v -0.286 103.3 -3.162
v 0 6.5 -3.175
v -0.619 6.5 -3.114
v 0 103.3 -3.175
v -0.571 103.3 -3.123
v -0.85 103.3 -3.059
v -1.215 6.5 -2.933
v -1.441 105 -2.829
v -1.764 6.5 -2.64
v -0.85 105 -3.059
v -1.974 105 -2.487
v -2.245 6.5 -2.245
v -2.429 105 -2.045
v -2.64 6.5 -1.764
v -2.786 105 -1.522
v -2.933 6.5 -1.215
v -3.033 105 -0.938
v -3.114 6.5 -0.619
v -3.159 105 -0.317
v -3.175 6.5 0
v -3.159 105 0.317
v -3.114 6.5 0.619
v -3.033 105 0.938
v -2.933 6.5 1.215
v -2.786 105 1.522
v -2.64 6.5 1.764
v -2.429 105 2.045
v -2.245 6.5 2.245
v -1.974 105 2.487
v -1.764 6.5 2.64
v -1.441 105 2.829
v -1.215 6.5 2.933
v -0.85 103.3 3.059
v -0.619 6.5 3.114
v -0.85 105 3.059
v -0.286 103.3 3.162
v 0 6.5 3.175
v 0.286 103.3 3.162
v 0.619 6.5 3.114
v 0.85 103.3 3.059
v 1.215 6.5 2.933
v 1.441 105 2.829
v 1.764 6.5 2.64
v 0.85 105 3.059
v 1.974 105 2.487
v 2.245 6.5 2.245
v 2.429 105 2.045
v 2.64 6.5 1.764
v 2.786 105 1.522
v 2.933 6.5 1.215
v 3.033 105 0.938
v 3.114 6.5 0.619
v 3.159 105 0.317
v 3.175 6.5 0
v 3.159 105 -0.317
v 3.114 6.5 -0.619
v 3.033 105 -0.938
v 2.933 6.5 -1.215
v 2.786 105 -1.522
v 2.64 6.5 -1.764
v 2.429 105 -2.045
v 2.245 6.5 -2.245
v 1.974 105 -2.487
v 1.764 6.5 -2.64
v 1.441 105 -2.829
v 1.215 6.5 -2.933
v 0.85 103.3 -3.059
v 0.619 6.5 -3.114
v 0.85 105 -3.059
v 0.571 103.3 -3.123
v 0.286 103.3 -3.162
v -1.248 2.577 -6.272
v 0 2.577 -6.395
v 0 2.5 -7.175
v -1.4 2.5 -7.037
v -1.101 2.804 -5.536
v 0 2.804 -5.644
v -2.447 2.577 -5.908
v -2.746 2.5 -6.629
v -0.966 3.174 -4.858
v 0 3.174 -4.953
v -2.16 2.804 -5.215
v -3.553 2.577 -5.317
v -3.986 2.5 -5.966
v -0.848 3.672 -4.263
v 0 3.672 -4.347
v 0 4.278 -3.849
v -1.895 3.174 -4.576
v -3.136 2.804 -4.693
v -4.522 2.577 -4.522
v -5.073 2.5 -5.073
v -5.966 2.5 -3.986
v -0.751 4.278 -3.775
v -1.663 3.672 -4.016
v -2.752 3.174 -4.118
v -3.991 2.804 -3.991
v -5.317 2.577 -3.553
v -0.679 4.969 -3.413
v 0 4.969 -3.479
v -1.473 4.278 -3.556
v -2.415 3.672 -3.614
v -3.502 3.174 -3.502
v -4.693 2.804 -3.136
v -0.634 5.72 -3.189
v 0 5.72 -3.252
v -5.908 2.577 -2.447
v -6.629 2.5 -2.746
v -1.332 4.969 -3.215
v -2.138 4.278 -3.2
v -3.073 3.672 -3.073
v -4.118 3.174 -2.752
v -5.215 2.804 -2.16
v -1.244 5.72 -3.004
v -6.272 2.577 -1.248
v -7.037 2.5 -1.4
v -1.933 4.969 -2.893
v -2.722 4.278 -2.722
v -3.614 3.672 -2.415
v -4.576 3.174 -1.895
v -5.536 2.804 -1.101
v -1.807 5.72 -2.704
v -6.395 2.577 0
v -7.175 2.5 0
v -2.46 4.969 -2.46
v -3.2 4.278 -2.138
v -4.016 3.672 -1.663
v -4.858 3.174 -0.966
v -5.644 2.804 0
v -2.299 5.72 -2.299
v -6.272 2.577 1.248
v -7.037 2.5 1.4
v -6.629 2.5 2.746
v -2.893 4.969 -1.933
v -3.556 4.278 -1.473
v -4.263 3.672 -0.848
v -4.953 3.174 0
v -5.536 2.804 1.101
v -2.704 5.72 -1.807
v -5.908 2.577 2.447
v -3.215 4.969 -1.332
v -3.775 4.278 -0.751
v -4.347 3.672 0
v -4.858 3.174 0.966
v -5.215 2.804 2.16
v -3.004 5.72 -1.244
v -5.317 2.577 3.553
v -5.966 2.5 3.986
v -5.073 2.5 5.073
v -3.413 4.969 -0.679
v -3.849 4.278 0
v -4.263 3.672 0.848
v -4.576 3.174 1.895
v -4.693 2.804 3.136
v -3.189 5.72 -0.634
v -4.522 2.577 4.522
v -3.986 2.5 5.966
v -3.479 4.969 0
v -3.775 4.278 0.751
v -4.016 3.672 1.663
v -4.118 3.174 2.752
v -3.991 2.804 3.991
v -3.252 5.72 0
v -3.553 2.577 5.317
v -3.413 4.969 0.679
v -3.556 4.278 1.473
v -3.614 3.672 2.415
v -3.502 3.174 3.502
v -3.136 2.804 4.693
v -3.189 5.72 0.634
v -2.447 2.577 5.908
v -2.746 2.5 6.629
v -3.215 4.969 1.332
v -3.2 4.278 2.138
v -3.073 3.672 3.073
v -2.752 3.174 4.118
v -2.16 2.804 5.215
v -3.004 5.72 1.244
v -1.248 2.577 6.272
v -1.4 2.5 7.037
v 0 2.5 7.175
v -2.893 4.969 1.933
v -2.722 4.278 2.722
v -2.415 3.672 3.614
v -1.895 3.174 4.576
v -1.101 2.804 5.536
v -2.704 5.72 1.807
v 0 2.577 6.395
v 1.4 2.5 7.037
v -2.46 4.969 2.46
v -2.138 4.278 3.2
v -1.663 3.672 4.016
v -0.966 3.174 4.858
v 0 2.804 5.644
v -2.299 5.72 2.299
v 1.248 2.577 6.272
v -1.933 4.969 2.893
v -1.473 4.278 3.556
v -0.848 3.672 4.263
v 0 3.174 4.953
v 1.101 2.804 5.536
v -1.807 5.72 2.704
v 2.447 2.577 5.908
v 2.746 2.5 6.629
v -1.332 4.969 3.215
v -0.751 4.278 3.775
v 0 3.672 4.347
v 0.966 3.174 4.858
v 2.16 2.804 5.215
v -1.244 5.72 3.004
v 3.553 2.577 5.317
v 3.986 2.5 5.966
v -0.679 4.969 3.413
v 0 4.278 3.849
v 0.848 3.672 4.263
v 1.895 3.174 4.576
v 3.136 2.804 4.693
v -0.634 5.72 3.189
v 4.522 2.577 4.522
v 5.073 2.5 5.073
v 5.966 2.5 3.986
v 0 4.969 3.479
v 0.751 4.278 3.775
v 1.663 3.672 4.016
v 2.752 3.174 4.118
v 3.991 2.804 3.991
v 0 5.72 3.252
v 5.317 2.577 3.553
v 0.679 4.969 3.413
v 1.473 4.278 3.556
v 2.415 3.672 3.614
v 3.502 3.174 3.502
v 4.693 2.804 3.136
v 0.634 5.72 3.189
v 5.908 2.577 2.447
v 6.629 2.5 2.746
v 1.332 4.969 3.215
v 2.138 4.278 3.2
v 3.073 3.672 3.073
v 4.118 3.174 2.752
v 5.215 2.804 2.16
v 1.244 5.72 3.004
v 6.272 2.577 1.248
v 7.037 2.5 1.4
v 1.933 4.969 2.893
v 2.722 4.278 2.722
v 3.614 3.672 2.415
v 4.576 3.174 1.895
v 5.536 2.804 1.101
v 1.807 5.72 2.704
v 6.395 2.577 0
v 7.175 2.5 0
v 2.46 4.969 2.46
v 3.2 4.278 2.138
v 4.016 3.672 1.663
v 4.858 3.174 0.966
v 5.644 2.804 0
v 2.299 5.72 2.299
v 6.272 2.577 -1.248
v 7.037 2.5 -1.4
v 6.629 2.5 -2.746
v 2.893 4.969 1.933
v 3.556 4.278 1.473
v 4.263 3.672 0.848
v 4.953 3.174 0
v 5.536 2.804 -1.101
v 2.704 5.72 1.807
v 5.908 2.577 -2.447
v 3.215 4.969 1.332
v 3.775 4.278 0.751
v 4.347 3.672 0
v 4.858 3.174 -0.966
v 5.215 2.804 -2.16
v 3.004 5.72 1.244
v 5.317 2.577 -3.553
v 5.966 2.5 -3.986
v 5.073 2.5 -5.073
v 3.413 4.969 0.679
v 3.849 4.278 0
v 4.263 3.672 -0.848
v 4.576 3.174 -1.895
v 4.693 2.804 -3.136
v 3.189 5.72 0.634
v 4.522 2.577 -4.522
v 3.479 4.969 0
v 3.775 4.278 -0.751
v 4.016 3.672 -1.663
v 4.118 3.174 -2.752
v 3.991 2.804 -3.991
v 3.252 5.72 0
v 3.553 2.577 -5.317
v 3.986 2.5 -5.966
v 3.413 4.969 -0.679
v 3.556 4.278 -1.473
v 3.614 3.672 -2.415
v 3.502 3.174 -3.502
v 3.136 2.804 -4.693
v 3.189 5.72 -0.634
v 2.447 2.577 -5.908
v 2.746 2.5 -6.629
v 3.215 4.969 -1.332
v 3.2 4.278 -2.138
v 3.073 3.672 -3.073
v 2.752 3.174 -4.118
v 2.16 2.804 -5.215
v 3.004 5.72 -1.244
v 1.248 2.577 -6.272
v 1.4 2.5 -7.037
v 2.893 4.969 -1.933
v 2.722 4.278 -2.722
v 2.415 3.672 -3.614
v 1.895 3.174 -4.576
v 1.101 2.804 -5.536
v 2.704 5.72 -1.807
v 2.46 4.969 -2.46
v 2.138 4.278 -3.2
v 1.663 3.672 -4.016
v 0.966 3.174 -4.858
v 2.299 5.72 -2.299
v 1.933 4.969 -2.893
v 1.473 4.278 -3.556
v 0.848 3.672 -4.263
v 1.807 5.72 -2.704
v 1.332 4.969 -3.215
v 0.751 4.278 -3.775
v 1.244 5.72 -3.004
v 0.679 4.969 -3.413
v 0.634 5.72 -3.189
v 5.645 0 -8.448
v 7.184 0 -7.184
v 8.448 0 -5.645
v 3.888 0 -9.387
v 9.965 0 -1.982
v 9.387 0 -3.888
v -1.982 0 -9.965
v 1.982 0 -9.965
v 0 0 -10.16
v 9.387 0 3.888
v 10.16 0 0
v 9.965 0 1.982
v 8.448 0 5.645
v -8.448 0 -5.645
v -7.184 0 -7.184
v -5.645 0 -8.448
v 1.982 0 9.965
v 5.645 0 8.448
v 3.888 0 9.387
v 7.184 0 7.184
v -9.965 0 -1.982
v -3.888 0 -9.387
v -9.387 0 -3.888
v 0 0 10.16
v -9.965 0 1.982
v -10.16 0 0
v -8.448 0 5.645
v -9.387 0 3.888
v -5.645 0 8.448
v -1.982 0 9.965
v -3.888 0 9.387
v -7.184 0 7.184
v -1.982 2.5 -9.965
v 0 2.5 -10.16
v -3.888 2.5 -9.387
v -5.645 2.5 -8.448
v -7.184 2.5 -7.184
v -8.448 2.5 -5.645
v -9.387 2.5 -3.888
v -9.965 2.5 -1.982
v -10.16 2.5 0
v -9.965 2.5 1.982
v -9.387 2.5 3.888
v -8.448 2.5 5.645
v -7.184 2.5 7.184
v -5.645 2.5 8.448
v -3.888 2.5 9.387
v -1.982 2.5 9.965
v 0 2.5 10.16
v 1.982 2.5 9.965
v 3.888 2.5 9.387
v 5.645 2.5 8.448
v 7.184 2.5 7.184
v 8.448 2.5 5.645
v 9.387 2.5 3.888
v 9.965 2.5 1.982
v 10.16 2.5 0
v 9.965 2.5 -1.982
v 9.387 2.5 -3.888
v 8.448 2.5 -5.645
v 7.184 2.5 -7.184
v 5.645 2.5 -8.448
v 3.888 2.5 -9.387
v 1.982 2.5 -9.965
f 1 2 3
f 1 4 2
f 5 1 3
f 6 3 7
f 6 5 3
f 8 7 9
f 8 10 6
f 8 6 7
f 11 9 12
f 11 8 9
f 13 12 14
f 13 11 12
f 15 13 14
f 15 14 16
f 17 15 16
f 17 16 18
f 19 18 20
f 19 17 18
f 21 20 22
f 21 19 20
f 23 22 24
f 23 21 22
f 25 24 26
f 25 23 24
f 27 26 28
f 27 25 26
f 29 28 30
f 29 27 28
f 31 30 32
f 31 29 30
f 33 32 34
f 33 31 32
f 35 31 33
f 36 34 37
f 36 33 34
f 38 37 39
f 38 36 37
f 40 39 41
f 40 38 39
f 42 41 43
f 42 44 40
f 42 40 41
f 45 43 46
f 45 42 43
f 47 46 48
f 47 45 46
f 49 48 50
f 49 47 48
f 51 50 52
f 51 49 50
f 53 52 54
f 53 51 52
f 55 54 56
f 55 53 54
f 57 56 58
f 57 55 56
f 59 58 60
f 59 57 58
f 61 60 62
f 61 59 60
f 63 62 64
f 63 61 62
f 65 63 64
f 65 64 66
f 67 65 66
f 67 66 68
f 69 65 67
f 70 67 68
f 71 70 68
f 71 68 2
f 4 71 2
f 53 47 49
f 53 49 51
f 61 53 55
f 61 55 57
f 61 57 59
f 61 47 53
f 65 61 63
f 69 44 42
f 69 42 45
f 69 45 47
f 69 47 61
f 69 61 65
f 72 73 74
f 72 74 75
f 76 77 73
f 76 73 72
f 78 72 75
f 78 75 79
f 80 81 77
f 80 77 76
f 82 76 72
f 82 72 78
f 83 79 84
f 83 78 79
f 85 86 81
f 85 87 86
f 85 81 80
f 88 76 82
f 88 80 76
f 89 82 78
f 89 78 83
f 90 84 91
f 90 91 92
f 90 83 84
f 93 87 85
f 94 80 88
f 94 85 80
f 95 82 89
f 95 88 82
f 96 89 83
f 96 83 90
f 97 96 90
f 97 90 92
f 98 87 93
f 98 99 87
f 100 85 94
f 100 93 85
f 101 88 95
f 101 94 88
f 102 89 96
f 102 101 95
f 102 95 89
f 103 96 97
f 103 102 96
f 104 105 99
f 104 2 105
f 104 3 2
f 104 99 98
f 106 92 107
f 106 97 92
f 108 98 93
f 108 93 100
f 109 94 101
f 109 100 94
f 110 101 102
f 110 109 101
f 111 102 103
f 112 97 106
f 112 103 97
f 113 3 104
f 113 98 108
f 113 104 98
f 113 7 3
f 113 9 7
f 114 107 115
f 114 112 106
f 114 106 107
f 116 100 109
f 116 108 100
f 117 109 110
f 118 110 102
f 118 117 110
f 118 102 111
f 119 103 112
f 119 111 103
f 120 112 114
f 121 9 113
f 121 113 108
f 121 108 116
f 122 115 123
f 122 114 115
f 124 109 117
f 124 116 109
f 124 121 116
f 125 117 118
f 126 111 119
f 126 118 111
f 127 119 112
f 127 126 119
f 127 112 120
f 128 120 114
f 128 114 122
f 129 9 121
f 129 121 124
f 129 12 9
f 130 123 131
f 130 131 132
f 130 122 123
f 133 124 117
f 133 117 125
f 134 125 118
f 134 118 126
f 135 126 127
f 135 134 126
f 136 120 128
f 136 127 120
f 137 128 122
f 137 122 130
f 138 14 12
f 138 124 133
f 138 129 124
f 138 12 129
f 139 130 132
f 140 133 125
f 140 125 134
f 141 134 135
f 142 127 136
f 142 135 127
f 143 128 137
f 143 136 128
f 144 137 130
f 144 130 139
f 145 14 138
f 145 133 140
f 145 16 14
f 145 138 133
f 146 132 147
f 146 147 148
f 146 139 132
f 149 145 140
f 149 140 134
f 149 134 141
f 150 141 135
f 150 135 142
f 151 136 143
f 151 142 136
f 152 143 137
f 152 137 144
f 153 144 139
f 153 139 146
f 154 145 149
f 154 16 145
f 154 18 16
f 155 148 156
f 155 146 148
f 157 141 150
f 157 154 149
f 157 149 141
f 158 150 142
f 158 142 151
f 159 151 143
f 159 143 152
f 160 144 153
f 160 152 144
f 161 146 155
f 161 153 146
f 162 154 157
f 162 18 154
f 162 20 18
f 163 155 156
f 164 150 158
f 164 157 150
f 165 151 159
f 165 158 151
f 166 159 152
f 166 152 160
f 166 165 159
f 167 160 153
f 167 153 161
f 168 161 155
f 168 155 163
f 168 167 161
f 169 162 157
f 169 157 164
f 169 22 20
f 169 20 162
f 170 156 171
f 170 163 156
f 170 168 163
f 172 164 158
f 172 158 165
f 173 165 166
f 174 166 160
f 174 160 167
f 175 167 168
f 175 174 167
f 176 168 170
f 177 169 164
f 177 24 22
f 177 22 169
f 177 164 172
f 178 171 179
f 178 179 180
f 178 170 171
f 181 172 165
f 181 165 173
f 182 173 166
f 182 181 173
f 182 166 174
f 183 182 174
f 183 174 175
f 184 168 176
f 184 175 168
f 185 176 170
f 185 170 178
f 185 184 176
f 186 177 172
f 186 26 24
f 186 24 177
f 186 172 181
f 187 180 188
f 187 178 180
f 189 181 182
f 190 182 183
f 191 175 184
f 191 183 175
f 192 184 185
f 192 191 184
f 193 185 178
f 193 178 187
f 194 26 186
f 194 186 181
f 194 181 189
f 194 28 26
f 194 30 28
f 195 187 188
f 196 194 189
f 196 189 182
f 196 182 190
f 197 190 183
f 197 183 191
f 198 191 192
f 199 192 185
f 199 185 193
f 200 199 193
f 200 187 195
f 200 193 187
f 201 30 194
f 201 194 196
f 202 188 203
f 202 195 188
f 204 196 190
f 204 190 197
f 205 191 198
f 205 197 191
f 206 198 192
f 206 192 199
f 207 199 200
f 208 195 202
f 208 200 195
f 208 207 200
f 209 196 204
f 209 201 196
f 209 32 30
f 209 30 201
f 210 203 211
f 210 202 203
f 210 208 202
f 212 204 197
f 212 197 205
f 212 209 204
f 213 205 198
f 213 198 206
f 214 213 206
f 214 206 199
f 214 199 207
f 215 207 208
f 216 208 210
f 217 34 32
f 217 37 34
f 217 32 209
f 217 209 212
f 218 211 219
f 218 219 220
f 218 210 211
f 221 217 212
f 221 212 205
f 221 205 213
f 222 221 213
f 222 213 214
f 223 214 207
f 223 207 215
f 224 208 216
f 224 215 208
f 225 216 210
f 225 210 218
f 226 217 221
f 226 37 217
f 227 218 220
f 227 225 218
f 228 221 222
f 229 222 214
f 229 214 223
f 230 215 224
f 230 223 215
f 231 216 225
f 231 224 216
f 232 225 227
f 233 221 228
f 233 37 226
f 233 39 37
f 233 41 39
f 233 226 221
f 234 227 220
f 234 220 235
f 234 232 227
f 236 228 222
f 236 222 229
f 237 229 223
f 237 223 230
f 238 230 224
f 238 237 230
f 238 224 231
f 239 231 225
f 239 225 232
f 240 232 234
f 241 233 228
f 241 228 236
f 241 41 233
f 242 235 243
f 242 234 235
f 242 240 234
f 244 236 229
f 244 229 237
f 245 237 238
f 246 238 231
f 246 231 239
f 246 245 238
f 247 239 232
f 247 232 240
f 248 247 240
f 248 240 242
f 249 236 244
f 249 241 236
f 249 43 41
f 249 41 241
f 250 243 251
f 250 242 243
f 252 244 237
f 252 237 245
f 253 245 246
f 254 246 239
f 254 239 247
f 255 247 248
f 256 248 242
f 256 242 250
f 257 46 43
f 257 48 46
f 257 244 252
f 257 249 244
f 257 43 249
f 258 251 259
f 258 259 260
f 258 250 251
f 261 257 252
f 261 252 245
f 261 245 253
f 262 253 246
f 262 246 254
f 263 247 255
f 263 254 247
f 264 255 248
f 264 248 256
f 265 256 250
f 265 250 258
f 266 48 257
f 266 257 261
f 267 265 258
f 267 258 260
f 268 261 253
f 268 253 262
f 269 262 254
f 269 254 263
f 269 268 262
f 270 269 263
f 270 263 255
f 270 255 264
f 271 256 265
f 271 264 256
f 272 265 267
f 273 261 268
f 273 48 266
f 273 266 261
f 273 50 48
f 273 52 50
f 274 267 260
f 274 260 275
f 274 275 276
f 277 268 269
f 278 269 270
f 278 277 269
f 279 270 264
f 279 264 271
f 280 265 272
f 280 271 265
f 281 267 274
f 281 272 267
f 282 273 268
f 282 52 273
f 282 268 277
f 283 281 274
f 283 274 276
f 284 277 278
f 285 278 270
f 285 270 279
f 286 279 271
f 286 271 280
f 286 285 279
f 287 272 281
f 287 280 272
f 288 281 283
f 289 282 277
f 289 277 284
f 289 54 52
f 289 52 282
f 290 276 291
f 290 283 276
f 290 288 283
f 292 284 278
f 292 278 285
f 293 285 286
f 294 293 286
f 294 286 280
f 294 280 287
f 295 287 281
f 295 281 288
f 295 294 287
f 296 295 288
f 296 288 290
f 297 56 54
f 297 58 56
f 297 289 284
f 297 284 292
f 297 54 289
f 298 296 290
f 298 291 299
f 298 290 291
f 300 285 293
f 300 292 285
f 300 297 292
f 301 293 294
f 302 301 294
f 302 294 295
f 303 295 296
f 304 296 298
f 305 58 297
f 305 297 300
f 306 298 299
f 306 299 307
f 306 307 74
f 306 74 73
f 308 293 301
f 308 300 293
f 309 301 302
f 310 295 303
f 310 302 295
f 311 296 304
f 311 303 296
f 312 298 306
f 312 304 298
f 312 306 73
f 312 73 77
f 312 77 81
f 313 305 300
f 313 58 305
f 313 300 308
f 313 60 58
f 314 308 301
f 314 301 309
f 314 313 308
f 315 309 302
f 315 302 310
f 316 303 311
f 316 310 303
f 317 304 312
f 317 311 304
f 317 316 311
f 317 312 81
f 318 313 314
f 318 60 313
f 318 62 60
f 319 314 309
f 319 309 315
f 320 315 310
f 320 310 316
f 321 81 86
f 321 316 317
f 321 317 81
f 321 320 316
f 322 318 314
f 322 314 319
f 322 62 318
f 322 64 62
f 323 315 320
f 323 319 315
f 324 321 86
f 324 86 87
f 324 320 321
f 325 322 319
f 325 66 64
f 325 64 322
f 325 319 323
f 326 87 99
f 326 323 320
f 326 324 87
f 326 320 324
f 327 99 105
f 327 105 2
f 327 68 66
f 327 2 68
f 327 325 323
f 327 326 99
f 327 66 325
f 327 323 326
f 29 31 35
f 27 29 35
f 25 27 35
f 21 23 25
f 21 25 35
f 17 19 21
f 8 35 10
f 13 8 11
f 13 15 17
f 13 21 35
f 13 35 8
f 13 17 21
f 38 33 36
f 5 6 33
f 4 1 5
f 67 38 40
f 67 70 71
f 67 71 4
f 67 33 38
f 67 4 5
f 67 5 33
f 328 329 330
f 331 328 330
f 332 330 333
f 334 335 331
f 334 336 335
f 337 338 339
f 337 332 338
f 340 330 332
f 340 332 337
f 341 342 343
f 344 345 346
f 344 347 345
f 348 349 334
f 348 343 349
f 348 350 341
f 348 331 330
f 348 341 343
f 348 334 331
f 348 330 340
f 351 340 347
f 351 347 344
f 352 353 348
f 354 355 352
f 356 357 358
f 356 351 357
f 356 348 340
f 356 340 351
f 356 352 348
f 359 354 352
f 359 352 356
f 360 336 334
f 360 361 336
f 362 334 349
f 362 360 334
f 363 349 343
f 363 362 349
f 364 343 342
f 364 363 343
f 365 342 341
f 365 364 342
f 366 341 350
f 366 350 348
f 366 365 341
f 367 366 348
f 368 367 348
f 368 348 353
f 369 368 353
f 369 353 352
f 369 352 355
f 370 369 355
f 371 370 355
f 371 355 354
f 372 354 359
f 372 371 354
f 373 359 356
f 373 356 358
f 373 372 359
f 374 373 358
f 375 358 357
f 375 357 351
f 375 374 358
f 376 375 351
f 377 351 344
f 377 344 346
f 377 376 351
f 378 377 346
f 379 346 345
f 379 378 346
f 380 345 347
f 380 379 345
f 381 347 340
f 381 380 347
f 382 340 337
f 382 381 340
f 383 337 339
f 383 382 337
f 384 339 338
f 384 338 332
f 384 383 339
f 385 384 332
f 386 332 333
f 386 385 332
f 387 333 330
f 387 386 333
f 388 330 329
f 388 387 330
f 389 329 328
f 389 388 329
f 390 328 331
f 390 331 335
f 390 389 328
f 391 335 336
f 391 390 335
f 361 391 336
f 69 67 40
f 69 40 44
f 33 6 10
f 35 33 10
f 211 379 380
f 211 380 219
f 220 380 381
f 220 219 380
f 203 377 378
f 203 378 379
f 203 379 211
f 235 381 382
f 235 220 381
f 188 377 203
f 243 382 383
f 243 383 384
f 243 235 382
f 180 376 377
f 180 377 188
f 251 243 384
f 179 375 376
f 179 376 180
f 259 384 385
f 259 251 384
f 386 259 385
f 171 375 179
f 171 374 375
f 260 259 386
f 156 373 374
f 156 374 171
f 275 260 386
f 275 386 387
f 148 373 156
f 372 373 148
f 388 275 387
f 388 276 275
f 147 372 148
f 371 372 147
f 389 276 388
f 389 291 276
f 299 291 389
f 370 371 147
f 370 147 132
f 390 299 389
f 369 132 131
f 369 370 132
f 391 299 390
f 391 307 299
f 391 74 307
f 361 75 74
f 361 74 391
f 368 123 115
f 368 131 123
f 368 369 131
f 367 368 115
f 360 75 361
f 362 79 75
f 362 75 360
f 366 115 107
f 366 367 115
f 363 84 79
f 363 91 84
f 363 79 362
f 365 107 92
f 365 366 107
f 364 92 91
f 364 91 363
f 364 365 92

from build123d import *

# Parameters (mm, degrees)
FILLET1_R               = 4
CUT_EXTRUDE3_DEPTH      = 106.978541224
CUT_EXTRUDE3_DEPTH_BACK = 106.978541224
SKETCH4_W               = 1.7
SKETCH4_H               = 1.7


with BuildPart() as part:
    # Sketch1 → Revolve1 (revolve)
    with BuildSketch(Plane.XY, mode=Mode.PRIVATE) as revolve1_sk:
        Polygon((0, 0), (10.16, 0), (10.16, 2.5), (3.175, 2.5), (3.175, 105), (0, 105), align=None)
    revolve(revolve1_sk.sketch.rotate(Axis((0, -31.831703756, 0), (0, 1, 0)), 90), axis=Axis((0, -31.831703756, 0), (0, 1, 0)))

    # Fillet1
    fillet1_edges = [part.edges().sort_by_distance(p)[0] for p in [
        (0, 2.5, 3.175),
    ]]
    fillet(fillet1_edges, radius=FILLET1_R)

    # Sketch4 → Cut-Extrude3 (cut, two sides: drawn at the far end of the back side and taken through both)
    with BuildSketch(Plane.XY.offset(-CUT_EXTRUDE3_DEPTH_BACK)):
        with Locations((0, 104.15)):
            Rectangle(SKETCH4_W, SKETCH4_H)
    extrude(amount=CUT_EXTRUDE3_DEPTH + CUT_EXTRUDE3_DEPTH_BACK, mode=Mode.SUBTRACT)


solid = part.part
